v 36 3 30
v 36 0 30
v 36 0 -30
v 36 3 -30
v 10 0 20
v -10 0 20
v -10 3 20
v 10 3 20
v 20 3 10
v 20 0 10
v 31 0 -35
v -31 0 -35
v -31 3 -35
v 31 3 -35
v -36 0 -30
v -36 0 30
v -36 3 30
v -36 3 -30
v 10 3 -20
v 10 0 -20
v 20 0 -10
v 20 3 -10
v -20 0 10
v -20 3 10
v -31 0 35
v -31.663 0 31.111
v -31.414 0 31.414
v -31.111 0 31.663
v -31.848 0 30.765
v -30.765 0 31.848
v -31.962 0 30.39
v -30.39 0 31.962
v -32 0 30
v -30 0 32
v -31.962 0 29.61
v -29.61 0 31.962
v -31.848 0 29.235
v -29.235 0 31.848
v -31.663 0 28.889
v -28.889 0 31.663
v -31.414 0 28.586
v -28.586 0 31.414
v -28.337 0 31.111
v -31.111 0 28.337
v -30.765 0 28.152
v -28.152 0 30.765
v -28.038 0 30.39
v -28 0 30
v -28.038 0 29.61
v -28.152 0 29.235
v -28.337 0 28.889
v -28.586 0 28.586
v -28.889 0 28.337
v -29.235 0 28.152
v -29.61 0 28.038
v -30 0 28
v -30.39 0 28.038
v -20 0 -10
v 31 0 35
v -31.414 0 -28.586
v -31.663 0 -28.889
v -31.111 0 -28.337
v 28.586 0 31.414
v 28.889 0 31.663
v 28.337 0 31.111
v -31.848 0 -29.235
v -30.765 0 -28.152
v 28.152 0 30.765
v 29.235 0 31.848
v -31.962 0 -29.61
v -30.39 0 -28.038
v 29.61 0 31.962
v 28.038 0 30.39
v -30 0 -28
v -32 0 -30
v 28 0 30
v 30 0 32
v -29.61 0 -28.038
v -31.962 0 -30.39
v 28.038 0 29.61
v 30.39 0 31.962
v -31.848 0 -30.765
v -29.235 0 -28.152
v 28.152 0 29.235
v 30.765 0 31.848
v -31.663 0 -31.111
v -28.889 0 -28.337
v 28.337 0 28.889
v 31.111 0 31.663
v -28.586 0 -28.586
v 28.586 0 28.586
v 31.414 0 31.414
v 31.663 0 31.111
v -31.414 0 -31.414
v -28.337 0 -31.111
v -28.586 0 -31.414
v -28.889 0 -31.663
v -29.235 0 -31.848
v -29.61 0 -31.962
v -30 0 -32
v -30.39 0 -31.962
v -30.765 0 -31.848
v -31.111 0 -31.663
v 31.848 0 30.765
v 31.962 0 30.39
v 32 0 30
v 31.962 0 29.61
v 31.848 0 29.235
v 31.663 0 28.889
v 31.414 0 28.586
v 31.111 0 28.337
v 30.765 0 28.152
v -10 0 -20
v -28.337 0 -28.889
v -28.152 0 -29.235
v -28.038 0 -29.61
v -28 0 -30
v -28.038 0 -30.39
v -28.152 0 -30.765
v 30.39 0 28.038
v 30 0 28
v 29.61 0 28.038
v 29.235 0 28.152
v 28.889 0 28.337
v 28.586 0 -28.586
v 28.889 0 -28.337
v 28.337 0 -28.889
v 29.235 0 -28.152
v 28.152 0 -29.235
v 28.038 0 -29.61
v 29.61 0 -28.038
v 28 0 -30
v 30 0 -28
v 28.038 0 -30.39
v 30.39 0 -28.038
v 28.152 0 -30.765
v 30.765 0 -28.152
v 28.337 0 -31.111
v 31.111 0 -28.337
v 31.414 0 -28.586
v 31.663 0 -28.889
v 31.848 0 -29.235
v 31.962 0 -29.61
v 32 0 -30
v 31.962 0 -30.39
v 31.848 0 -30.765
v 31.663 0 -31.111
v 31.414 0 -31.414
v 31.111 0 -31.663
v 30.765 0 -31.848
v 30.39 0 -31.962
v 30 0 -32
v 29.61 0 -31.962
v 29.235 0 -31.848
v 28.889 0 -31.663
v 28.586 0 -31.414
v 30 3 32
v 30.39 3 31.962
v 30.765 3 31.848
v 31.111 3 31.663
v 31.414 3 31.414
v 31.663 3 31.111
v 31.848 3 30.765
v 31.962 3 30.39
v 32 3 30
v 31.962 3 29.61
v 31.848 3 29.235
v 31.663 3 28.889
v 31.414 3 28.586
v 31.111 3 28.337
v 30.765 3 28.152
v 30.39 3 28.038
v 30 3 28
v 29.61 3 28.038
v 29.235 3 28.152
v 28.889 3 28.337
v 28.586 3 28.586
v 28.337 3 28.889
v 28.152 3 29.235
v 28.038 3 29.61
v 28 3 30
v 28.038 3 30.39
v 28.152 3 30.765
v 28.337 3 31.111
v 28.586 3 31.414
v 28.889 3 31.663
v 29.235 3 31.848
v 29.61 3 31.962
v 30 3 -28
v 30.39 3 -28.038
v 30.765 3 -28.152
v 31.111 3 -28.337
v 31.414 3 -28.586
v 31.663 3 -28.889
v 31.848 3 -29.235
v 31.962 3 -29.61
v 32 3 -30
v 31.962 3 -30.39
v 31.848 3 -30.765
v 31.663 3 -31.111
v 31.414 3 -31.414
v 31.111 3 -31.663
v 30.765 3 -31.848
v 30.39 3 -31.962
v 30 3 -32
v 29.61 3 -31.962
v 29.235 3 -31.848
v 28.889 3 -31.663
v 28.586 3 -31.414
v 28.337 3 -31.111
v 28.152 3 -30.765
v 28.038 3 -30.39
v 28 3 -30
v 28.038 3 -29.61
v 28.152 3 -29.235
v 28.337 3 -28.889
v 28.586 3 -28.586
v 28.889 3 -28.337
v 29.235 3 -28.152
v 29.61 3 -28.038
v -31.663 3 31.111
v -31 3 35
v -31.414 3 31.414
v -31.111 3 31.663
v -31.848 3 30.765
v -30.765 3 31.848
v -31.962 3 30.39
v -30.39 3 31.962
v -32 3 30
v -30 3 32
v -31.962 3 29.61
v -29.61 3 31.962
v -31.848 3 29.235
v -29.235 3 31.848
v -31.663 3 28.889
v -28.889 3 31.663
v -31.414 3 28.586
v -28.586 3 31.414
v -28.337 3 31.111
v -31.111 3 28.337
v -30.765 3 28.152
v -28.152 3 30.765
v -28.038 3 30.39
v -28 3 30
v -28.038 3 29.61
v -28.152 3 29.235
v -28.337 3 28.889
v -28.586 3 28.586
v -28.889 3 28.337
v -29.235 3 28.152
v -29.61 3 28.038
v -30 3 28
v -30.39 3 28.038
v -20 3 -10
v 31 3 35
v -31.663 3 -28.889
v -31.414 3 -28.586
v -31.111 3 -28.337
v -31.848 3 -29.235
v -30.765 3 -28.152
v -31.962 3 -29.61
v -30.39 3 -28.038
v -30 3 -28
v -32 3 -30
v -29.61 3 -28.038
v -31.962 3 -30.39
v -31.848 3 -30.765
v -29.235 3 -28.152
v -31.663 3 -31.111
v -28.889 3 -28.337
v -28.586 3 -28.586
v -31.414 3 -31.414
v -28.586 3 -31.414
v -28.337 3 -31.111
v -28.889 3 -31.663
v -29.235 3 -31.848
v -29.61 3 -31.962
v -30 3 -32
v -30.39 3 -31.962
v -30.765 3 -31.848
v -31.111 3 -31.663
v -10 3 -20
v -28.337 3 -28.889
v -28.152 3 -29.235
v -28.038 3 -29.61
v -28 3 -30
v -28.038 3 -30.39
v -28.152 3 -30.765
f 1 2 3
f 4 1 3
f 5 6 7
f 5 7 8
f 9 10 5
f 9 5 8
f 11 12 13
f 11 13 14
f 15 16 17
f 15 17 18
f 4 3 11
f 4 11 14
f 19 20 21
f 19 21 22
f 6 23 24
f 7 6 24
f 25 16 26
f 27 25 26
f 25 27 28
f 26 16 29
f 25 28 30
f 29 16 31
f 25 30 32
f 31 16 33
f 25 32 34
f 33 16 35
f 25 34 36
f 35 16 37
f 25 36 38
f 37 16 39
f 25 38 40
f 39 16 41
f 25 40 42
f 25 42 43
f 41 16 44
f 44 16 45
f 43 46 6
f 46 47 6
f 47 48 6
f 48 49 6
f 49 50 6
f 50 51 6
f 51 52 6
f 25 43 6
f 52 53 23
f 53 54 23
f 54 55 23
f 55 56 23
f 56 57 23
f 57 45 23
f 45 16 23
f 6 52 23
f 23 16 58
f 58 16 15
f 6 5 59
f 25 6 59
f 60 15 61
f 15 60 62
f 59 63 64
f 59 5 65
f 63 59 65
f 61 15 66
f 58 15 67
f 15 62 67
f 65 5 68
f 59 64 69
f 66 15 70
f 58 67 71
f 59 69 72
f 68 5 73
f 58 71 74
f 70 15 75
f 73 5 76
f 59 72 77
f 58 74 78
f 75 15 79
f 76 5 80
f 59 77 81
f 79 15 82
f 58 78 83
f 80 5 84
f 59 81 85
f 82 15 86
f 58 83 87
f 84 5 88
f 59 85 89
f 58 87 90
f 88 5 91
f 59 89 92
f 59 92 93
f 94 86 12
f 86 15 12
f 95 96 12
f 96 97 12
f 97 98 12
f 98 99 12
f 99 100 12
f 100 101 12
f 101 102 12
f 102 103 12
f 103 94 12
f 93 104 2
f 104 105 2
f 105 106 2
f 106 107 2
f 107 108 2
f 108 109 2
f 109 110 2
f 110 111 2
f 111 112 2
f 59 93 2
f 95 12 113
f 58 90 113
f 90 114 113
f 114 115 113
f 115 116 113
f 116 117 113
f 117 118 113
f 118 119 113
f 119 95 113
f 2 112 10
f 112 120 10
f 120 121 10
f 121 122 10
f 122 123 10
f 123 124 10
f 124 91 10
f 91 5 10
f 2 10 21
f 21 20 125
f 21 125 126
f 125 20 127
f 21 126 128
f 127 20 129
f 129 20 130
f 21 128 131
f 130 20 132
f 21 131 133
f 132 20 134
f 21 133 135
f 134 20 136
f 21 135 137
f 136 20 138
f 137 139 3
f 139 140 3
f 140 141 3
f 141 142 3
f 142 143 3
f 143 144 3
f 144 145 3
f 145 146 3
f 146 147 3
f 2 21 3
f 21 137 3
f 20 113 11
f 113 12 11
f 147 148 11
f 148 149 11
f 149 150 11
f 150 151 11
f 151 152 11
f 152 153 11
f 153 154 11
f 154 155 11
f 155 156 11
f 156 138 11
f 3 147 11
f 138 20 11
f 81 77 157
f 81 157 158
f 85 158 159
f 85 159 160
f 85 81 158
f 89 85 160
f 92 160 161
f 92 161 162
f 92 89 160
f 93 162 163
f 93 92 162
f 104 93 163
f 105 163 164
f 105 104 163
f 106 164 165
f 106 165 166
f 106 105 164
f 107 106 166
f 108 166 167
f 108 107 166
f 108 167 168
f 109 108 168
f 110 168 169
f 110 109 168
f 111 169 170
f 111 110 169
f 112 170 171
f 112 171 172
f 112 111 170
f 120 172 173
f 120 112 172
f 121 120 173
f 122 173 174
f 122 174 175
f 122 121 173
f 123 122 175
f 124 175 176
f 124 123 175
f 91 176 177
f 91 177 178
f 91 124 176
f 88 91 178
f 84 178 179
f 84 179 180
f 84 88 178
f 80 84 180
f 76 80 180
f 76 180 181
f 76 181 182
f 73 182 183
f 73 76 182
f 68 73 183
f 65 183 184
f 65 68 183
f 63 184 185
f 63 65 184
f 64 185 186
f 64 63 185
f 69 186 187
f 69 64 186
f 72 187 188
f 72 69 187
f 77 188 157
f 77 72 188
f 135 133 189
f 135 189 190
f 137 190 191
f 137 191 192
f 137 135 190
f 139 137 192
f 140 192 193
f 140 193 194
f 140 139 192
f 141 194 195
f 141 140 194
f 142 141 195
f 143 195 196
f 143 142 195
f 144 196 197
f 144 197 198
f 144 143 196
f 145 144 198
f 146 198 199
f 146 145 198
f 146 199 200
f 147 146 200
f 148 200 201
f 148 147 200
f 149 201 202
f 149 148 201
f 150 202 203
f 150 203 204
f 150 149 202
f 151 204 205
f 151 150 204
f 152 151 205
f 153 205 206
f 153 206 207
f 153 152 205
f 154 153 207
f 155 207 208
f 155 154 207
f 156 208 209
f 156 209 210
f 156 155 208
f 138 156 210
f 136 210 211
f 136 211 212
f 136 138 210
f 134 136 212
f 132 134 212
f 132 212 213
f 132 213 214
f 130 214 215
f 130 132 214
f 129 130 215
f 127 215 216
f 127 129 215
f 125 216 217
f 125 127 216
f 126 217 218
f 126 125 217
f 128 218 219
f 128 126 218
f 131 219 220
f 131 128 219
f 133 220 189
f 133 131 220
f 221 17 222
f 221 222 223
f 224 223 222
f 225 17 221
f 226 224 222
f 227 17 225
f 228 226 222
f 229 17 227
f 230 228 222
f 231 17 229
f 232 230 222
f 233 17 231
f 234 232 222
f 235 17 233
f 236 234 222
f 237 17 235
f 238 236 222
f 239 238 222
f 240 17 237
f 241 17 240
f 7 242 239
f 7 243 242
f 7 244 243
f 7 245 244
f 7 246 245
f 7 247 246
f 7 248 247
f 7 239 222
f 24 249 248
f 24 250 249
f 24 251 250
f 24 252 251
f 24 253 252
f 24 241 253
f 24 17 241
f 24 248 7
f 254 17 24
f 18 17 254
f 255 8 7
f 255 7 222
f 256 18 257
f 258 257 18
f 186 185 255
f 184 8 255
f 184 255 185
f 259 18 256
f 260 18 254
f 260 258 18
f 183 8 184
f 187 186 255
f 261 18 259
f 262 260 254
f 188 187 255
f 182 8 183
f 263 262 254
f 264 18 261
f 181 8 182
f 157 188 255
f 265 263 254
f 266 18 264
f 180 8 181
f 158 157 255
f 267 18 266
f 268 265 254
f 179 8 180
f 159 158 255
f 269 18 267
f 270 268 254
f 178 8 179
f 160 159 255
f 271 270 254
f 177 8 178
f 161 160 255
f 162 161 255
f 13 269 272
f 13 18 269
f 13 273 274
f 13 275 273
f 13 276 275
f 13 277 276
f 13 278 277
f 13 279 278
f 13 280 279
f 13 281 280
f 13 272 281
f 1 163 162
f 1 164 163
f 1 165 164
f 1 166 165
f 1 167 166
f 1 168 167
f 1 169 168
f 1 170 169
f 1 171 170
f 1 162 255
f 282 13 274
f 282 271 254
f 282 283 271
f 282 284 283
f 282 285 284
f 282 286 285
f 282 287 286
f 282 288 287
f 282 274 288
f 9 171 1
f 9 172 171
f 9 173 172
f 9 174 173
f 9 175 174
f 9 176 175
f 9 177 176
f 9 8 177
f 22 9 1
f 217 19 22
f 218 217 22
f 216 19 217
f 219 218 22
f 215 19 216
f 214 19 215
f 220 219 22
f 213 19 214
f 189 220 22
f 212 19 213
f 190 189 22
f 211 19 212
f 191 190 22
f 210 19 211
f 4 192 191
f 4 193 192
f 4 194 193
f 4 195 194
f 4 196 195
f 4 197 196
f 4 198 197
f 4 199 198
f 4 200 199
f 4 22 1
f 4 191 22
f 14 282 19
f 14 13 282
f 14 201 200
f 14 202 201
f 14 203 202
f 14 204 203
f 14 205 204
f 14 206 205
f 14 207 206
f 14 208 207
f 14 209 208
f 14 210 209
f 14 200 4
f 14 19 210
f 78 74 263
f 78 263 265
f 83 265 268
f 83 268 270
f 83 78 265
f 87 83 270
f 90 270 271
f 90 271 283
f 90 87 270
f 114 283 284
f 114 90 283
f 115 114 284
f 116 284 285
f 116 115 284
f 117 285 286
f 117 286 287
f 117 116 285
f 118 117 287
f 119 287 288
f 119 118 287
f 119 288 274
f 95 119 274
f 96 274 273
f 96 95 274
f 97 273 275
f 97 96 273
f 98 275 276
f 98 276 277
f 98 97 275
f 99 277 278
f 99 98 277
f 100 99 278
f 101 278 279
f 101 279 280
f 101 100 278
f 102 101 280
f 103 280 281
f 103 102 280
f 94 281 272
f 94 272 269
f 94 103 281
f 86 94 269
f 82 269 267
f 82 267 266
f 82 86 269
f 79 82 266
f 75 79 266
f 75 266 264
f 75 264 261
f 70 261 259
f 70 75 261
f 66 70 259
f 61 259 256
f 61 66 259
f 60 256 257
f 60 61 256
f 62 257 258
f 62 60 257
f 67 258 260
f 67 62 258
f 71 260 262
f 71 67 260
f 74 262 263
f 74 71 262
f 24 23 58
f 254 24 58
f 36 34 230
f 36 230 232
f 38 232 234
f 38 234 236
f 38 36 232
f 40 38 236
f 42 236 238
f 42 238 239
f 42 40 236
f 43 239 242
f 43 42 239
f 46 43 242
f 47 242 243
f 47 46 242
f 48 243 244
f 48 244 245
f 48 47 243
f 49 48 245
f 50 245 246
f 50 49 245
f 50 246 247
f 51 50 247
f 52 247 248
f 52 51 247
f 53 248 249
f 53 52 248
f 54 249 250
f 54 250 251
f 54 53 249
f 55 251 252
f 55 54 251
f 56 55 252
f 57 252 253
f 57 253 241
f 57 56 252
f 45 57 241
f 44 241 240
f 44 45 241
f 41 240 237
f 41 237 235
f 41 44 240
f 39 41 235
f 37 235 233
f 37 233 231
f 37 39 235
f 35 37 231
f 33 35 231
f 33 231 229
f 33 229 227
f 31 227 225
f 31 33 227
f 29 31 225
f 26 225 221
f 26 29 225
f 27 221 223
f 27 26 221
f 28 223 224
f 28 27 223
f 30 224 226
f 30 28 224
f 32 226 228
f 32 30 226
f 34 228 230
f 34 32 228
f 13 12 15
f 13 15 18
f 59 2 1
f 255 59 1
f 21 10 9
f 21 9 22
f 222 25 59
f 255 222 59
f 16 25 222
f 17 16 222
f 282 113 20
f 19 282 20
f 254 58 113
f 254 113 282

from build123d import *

# Parameters (mm, degrees)
SKETCH_1_W      = 72
SKETCH_1_H      = 70
SKETCH_1_R      = 2
SKETCH_1_W_2    = 40
SKETCH_1_H_2    = 40
EXTRUDE_1_DEPTH = 3
CHAMFER_1_SIZE  = 10
CHAMFER_2_SIZE  = 5


with BuildPart() as part:
    # 草图1 → 凸台-拉伸1 (new body)
    with BuildSketch(Plane(origin=(0, 0, 0), x_dir=(1, 0, 0), z_dir=(0, 1, 0))):
        Rectangle(SKETCH_1_W, SKETCH_1_H)
        with Locations(Location((-30, 30, 0), (0, 0, 270))):
            Circle(SKETCH_1_R, mode=Mode.SUBTRACT)
        with Locations(Location((30, 30, 0), (0, 0, 270))):
            Circle(SKETCH_1_R, mode=Mode.SUBTRACT)
        with Locations(Location((30, -30, 0), (0, 0, 270))):
            Circle(SKETCH_1_R, mode=Mode.SUBTRACT)
        with Locations(Location((-30, -30, 0), (0, 0, 270))):
            Circle(SKETCH_1_R, mode=Mode.SUBTRACT)
        Rectangle(SKETCH_1_W_2, SKETCH_1_H_2, mode=Mode.SUBTRACT)
    extrude(amount=EXTRUDE_1_DEPTH)

    # 倒角1
    chamfer_1_edges = [part.edges().sort_by_distance(p)[0] for p in [
        (20, 1.5, -20),
        (-20, 1.5, -20),
        (-20, 1.5, 20),
        (20, 1.5, 20),
    ]]
    chamfer(chamfer_1_edges, length=CHAMFER_1_SIZE)

    # 倒角2
    chamfer_2_edges = [part.edges().sort_by_distance(p)[0] for p in [
        (-36, 1.5, 35),
        (-36, 1.5, -35),
        (36, 1.5, -35),
        (36, 1.5, 35),
    ]]
    chamfer(chamfer_2_edges, length=CHAMFER_2_SIZE)


solid = part.part
